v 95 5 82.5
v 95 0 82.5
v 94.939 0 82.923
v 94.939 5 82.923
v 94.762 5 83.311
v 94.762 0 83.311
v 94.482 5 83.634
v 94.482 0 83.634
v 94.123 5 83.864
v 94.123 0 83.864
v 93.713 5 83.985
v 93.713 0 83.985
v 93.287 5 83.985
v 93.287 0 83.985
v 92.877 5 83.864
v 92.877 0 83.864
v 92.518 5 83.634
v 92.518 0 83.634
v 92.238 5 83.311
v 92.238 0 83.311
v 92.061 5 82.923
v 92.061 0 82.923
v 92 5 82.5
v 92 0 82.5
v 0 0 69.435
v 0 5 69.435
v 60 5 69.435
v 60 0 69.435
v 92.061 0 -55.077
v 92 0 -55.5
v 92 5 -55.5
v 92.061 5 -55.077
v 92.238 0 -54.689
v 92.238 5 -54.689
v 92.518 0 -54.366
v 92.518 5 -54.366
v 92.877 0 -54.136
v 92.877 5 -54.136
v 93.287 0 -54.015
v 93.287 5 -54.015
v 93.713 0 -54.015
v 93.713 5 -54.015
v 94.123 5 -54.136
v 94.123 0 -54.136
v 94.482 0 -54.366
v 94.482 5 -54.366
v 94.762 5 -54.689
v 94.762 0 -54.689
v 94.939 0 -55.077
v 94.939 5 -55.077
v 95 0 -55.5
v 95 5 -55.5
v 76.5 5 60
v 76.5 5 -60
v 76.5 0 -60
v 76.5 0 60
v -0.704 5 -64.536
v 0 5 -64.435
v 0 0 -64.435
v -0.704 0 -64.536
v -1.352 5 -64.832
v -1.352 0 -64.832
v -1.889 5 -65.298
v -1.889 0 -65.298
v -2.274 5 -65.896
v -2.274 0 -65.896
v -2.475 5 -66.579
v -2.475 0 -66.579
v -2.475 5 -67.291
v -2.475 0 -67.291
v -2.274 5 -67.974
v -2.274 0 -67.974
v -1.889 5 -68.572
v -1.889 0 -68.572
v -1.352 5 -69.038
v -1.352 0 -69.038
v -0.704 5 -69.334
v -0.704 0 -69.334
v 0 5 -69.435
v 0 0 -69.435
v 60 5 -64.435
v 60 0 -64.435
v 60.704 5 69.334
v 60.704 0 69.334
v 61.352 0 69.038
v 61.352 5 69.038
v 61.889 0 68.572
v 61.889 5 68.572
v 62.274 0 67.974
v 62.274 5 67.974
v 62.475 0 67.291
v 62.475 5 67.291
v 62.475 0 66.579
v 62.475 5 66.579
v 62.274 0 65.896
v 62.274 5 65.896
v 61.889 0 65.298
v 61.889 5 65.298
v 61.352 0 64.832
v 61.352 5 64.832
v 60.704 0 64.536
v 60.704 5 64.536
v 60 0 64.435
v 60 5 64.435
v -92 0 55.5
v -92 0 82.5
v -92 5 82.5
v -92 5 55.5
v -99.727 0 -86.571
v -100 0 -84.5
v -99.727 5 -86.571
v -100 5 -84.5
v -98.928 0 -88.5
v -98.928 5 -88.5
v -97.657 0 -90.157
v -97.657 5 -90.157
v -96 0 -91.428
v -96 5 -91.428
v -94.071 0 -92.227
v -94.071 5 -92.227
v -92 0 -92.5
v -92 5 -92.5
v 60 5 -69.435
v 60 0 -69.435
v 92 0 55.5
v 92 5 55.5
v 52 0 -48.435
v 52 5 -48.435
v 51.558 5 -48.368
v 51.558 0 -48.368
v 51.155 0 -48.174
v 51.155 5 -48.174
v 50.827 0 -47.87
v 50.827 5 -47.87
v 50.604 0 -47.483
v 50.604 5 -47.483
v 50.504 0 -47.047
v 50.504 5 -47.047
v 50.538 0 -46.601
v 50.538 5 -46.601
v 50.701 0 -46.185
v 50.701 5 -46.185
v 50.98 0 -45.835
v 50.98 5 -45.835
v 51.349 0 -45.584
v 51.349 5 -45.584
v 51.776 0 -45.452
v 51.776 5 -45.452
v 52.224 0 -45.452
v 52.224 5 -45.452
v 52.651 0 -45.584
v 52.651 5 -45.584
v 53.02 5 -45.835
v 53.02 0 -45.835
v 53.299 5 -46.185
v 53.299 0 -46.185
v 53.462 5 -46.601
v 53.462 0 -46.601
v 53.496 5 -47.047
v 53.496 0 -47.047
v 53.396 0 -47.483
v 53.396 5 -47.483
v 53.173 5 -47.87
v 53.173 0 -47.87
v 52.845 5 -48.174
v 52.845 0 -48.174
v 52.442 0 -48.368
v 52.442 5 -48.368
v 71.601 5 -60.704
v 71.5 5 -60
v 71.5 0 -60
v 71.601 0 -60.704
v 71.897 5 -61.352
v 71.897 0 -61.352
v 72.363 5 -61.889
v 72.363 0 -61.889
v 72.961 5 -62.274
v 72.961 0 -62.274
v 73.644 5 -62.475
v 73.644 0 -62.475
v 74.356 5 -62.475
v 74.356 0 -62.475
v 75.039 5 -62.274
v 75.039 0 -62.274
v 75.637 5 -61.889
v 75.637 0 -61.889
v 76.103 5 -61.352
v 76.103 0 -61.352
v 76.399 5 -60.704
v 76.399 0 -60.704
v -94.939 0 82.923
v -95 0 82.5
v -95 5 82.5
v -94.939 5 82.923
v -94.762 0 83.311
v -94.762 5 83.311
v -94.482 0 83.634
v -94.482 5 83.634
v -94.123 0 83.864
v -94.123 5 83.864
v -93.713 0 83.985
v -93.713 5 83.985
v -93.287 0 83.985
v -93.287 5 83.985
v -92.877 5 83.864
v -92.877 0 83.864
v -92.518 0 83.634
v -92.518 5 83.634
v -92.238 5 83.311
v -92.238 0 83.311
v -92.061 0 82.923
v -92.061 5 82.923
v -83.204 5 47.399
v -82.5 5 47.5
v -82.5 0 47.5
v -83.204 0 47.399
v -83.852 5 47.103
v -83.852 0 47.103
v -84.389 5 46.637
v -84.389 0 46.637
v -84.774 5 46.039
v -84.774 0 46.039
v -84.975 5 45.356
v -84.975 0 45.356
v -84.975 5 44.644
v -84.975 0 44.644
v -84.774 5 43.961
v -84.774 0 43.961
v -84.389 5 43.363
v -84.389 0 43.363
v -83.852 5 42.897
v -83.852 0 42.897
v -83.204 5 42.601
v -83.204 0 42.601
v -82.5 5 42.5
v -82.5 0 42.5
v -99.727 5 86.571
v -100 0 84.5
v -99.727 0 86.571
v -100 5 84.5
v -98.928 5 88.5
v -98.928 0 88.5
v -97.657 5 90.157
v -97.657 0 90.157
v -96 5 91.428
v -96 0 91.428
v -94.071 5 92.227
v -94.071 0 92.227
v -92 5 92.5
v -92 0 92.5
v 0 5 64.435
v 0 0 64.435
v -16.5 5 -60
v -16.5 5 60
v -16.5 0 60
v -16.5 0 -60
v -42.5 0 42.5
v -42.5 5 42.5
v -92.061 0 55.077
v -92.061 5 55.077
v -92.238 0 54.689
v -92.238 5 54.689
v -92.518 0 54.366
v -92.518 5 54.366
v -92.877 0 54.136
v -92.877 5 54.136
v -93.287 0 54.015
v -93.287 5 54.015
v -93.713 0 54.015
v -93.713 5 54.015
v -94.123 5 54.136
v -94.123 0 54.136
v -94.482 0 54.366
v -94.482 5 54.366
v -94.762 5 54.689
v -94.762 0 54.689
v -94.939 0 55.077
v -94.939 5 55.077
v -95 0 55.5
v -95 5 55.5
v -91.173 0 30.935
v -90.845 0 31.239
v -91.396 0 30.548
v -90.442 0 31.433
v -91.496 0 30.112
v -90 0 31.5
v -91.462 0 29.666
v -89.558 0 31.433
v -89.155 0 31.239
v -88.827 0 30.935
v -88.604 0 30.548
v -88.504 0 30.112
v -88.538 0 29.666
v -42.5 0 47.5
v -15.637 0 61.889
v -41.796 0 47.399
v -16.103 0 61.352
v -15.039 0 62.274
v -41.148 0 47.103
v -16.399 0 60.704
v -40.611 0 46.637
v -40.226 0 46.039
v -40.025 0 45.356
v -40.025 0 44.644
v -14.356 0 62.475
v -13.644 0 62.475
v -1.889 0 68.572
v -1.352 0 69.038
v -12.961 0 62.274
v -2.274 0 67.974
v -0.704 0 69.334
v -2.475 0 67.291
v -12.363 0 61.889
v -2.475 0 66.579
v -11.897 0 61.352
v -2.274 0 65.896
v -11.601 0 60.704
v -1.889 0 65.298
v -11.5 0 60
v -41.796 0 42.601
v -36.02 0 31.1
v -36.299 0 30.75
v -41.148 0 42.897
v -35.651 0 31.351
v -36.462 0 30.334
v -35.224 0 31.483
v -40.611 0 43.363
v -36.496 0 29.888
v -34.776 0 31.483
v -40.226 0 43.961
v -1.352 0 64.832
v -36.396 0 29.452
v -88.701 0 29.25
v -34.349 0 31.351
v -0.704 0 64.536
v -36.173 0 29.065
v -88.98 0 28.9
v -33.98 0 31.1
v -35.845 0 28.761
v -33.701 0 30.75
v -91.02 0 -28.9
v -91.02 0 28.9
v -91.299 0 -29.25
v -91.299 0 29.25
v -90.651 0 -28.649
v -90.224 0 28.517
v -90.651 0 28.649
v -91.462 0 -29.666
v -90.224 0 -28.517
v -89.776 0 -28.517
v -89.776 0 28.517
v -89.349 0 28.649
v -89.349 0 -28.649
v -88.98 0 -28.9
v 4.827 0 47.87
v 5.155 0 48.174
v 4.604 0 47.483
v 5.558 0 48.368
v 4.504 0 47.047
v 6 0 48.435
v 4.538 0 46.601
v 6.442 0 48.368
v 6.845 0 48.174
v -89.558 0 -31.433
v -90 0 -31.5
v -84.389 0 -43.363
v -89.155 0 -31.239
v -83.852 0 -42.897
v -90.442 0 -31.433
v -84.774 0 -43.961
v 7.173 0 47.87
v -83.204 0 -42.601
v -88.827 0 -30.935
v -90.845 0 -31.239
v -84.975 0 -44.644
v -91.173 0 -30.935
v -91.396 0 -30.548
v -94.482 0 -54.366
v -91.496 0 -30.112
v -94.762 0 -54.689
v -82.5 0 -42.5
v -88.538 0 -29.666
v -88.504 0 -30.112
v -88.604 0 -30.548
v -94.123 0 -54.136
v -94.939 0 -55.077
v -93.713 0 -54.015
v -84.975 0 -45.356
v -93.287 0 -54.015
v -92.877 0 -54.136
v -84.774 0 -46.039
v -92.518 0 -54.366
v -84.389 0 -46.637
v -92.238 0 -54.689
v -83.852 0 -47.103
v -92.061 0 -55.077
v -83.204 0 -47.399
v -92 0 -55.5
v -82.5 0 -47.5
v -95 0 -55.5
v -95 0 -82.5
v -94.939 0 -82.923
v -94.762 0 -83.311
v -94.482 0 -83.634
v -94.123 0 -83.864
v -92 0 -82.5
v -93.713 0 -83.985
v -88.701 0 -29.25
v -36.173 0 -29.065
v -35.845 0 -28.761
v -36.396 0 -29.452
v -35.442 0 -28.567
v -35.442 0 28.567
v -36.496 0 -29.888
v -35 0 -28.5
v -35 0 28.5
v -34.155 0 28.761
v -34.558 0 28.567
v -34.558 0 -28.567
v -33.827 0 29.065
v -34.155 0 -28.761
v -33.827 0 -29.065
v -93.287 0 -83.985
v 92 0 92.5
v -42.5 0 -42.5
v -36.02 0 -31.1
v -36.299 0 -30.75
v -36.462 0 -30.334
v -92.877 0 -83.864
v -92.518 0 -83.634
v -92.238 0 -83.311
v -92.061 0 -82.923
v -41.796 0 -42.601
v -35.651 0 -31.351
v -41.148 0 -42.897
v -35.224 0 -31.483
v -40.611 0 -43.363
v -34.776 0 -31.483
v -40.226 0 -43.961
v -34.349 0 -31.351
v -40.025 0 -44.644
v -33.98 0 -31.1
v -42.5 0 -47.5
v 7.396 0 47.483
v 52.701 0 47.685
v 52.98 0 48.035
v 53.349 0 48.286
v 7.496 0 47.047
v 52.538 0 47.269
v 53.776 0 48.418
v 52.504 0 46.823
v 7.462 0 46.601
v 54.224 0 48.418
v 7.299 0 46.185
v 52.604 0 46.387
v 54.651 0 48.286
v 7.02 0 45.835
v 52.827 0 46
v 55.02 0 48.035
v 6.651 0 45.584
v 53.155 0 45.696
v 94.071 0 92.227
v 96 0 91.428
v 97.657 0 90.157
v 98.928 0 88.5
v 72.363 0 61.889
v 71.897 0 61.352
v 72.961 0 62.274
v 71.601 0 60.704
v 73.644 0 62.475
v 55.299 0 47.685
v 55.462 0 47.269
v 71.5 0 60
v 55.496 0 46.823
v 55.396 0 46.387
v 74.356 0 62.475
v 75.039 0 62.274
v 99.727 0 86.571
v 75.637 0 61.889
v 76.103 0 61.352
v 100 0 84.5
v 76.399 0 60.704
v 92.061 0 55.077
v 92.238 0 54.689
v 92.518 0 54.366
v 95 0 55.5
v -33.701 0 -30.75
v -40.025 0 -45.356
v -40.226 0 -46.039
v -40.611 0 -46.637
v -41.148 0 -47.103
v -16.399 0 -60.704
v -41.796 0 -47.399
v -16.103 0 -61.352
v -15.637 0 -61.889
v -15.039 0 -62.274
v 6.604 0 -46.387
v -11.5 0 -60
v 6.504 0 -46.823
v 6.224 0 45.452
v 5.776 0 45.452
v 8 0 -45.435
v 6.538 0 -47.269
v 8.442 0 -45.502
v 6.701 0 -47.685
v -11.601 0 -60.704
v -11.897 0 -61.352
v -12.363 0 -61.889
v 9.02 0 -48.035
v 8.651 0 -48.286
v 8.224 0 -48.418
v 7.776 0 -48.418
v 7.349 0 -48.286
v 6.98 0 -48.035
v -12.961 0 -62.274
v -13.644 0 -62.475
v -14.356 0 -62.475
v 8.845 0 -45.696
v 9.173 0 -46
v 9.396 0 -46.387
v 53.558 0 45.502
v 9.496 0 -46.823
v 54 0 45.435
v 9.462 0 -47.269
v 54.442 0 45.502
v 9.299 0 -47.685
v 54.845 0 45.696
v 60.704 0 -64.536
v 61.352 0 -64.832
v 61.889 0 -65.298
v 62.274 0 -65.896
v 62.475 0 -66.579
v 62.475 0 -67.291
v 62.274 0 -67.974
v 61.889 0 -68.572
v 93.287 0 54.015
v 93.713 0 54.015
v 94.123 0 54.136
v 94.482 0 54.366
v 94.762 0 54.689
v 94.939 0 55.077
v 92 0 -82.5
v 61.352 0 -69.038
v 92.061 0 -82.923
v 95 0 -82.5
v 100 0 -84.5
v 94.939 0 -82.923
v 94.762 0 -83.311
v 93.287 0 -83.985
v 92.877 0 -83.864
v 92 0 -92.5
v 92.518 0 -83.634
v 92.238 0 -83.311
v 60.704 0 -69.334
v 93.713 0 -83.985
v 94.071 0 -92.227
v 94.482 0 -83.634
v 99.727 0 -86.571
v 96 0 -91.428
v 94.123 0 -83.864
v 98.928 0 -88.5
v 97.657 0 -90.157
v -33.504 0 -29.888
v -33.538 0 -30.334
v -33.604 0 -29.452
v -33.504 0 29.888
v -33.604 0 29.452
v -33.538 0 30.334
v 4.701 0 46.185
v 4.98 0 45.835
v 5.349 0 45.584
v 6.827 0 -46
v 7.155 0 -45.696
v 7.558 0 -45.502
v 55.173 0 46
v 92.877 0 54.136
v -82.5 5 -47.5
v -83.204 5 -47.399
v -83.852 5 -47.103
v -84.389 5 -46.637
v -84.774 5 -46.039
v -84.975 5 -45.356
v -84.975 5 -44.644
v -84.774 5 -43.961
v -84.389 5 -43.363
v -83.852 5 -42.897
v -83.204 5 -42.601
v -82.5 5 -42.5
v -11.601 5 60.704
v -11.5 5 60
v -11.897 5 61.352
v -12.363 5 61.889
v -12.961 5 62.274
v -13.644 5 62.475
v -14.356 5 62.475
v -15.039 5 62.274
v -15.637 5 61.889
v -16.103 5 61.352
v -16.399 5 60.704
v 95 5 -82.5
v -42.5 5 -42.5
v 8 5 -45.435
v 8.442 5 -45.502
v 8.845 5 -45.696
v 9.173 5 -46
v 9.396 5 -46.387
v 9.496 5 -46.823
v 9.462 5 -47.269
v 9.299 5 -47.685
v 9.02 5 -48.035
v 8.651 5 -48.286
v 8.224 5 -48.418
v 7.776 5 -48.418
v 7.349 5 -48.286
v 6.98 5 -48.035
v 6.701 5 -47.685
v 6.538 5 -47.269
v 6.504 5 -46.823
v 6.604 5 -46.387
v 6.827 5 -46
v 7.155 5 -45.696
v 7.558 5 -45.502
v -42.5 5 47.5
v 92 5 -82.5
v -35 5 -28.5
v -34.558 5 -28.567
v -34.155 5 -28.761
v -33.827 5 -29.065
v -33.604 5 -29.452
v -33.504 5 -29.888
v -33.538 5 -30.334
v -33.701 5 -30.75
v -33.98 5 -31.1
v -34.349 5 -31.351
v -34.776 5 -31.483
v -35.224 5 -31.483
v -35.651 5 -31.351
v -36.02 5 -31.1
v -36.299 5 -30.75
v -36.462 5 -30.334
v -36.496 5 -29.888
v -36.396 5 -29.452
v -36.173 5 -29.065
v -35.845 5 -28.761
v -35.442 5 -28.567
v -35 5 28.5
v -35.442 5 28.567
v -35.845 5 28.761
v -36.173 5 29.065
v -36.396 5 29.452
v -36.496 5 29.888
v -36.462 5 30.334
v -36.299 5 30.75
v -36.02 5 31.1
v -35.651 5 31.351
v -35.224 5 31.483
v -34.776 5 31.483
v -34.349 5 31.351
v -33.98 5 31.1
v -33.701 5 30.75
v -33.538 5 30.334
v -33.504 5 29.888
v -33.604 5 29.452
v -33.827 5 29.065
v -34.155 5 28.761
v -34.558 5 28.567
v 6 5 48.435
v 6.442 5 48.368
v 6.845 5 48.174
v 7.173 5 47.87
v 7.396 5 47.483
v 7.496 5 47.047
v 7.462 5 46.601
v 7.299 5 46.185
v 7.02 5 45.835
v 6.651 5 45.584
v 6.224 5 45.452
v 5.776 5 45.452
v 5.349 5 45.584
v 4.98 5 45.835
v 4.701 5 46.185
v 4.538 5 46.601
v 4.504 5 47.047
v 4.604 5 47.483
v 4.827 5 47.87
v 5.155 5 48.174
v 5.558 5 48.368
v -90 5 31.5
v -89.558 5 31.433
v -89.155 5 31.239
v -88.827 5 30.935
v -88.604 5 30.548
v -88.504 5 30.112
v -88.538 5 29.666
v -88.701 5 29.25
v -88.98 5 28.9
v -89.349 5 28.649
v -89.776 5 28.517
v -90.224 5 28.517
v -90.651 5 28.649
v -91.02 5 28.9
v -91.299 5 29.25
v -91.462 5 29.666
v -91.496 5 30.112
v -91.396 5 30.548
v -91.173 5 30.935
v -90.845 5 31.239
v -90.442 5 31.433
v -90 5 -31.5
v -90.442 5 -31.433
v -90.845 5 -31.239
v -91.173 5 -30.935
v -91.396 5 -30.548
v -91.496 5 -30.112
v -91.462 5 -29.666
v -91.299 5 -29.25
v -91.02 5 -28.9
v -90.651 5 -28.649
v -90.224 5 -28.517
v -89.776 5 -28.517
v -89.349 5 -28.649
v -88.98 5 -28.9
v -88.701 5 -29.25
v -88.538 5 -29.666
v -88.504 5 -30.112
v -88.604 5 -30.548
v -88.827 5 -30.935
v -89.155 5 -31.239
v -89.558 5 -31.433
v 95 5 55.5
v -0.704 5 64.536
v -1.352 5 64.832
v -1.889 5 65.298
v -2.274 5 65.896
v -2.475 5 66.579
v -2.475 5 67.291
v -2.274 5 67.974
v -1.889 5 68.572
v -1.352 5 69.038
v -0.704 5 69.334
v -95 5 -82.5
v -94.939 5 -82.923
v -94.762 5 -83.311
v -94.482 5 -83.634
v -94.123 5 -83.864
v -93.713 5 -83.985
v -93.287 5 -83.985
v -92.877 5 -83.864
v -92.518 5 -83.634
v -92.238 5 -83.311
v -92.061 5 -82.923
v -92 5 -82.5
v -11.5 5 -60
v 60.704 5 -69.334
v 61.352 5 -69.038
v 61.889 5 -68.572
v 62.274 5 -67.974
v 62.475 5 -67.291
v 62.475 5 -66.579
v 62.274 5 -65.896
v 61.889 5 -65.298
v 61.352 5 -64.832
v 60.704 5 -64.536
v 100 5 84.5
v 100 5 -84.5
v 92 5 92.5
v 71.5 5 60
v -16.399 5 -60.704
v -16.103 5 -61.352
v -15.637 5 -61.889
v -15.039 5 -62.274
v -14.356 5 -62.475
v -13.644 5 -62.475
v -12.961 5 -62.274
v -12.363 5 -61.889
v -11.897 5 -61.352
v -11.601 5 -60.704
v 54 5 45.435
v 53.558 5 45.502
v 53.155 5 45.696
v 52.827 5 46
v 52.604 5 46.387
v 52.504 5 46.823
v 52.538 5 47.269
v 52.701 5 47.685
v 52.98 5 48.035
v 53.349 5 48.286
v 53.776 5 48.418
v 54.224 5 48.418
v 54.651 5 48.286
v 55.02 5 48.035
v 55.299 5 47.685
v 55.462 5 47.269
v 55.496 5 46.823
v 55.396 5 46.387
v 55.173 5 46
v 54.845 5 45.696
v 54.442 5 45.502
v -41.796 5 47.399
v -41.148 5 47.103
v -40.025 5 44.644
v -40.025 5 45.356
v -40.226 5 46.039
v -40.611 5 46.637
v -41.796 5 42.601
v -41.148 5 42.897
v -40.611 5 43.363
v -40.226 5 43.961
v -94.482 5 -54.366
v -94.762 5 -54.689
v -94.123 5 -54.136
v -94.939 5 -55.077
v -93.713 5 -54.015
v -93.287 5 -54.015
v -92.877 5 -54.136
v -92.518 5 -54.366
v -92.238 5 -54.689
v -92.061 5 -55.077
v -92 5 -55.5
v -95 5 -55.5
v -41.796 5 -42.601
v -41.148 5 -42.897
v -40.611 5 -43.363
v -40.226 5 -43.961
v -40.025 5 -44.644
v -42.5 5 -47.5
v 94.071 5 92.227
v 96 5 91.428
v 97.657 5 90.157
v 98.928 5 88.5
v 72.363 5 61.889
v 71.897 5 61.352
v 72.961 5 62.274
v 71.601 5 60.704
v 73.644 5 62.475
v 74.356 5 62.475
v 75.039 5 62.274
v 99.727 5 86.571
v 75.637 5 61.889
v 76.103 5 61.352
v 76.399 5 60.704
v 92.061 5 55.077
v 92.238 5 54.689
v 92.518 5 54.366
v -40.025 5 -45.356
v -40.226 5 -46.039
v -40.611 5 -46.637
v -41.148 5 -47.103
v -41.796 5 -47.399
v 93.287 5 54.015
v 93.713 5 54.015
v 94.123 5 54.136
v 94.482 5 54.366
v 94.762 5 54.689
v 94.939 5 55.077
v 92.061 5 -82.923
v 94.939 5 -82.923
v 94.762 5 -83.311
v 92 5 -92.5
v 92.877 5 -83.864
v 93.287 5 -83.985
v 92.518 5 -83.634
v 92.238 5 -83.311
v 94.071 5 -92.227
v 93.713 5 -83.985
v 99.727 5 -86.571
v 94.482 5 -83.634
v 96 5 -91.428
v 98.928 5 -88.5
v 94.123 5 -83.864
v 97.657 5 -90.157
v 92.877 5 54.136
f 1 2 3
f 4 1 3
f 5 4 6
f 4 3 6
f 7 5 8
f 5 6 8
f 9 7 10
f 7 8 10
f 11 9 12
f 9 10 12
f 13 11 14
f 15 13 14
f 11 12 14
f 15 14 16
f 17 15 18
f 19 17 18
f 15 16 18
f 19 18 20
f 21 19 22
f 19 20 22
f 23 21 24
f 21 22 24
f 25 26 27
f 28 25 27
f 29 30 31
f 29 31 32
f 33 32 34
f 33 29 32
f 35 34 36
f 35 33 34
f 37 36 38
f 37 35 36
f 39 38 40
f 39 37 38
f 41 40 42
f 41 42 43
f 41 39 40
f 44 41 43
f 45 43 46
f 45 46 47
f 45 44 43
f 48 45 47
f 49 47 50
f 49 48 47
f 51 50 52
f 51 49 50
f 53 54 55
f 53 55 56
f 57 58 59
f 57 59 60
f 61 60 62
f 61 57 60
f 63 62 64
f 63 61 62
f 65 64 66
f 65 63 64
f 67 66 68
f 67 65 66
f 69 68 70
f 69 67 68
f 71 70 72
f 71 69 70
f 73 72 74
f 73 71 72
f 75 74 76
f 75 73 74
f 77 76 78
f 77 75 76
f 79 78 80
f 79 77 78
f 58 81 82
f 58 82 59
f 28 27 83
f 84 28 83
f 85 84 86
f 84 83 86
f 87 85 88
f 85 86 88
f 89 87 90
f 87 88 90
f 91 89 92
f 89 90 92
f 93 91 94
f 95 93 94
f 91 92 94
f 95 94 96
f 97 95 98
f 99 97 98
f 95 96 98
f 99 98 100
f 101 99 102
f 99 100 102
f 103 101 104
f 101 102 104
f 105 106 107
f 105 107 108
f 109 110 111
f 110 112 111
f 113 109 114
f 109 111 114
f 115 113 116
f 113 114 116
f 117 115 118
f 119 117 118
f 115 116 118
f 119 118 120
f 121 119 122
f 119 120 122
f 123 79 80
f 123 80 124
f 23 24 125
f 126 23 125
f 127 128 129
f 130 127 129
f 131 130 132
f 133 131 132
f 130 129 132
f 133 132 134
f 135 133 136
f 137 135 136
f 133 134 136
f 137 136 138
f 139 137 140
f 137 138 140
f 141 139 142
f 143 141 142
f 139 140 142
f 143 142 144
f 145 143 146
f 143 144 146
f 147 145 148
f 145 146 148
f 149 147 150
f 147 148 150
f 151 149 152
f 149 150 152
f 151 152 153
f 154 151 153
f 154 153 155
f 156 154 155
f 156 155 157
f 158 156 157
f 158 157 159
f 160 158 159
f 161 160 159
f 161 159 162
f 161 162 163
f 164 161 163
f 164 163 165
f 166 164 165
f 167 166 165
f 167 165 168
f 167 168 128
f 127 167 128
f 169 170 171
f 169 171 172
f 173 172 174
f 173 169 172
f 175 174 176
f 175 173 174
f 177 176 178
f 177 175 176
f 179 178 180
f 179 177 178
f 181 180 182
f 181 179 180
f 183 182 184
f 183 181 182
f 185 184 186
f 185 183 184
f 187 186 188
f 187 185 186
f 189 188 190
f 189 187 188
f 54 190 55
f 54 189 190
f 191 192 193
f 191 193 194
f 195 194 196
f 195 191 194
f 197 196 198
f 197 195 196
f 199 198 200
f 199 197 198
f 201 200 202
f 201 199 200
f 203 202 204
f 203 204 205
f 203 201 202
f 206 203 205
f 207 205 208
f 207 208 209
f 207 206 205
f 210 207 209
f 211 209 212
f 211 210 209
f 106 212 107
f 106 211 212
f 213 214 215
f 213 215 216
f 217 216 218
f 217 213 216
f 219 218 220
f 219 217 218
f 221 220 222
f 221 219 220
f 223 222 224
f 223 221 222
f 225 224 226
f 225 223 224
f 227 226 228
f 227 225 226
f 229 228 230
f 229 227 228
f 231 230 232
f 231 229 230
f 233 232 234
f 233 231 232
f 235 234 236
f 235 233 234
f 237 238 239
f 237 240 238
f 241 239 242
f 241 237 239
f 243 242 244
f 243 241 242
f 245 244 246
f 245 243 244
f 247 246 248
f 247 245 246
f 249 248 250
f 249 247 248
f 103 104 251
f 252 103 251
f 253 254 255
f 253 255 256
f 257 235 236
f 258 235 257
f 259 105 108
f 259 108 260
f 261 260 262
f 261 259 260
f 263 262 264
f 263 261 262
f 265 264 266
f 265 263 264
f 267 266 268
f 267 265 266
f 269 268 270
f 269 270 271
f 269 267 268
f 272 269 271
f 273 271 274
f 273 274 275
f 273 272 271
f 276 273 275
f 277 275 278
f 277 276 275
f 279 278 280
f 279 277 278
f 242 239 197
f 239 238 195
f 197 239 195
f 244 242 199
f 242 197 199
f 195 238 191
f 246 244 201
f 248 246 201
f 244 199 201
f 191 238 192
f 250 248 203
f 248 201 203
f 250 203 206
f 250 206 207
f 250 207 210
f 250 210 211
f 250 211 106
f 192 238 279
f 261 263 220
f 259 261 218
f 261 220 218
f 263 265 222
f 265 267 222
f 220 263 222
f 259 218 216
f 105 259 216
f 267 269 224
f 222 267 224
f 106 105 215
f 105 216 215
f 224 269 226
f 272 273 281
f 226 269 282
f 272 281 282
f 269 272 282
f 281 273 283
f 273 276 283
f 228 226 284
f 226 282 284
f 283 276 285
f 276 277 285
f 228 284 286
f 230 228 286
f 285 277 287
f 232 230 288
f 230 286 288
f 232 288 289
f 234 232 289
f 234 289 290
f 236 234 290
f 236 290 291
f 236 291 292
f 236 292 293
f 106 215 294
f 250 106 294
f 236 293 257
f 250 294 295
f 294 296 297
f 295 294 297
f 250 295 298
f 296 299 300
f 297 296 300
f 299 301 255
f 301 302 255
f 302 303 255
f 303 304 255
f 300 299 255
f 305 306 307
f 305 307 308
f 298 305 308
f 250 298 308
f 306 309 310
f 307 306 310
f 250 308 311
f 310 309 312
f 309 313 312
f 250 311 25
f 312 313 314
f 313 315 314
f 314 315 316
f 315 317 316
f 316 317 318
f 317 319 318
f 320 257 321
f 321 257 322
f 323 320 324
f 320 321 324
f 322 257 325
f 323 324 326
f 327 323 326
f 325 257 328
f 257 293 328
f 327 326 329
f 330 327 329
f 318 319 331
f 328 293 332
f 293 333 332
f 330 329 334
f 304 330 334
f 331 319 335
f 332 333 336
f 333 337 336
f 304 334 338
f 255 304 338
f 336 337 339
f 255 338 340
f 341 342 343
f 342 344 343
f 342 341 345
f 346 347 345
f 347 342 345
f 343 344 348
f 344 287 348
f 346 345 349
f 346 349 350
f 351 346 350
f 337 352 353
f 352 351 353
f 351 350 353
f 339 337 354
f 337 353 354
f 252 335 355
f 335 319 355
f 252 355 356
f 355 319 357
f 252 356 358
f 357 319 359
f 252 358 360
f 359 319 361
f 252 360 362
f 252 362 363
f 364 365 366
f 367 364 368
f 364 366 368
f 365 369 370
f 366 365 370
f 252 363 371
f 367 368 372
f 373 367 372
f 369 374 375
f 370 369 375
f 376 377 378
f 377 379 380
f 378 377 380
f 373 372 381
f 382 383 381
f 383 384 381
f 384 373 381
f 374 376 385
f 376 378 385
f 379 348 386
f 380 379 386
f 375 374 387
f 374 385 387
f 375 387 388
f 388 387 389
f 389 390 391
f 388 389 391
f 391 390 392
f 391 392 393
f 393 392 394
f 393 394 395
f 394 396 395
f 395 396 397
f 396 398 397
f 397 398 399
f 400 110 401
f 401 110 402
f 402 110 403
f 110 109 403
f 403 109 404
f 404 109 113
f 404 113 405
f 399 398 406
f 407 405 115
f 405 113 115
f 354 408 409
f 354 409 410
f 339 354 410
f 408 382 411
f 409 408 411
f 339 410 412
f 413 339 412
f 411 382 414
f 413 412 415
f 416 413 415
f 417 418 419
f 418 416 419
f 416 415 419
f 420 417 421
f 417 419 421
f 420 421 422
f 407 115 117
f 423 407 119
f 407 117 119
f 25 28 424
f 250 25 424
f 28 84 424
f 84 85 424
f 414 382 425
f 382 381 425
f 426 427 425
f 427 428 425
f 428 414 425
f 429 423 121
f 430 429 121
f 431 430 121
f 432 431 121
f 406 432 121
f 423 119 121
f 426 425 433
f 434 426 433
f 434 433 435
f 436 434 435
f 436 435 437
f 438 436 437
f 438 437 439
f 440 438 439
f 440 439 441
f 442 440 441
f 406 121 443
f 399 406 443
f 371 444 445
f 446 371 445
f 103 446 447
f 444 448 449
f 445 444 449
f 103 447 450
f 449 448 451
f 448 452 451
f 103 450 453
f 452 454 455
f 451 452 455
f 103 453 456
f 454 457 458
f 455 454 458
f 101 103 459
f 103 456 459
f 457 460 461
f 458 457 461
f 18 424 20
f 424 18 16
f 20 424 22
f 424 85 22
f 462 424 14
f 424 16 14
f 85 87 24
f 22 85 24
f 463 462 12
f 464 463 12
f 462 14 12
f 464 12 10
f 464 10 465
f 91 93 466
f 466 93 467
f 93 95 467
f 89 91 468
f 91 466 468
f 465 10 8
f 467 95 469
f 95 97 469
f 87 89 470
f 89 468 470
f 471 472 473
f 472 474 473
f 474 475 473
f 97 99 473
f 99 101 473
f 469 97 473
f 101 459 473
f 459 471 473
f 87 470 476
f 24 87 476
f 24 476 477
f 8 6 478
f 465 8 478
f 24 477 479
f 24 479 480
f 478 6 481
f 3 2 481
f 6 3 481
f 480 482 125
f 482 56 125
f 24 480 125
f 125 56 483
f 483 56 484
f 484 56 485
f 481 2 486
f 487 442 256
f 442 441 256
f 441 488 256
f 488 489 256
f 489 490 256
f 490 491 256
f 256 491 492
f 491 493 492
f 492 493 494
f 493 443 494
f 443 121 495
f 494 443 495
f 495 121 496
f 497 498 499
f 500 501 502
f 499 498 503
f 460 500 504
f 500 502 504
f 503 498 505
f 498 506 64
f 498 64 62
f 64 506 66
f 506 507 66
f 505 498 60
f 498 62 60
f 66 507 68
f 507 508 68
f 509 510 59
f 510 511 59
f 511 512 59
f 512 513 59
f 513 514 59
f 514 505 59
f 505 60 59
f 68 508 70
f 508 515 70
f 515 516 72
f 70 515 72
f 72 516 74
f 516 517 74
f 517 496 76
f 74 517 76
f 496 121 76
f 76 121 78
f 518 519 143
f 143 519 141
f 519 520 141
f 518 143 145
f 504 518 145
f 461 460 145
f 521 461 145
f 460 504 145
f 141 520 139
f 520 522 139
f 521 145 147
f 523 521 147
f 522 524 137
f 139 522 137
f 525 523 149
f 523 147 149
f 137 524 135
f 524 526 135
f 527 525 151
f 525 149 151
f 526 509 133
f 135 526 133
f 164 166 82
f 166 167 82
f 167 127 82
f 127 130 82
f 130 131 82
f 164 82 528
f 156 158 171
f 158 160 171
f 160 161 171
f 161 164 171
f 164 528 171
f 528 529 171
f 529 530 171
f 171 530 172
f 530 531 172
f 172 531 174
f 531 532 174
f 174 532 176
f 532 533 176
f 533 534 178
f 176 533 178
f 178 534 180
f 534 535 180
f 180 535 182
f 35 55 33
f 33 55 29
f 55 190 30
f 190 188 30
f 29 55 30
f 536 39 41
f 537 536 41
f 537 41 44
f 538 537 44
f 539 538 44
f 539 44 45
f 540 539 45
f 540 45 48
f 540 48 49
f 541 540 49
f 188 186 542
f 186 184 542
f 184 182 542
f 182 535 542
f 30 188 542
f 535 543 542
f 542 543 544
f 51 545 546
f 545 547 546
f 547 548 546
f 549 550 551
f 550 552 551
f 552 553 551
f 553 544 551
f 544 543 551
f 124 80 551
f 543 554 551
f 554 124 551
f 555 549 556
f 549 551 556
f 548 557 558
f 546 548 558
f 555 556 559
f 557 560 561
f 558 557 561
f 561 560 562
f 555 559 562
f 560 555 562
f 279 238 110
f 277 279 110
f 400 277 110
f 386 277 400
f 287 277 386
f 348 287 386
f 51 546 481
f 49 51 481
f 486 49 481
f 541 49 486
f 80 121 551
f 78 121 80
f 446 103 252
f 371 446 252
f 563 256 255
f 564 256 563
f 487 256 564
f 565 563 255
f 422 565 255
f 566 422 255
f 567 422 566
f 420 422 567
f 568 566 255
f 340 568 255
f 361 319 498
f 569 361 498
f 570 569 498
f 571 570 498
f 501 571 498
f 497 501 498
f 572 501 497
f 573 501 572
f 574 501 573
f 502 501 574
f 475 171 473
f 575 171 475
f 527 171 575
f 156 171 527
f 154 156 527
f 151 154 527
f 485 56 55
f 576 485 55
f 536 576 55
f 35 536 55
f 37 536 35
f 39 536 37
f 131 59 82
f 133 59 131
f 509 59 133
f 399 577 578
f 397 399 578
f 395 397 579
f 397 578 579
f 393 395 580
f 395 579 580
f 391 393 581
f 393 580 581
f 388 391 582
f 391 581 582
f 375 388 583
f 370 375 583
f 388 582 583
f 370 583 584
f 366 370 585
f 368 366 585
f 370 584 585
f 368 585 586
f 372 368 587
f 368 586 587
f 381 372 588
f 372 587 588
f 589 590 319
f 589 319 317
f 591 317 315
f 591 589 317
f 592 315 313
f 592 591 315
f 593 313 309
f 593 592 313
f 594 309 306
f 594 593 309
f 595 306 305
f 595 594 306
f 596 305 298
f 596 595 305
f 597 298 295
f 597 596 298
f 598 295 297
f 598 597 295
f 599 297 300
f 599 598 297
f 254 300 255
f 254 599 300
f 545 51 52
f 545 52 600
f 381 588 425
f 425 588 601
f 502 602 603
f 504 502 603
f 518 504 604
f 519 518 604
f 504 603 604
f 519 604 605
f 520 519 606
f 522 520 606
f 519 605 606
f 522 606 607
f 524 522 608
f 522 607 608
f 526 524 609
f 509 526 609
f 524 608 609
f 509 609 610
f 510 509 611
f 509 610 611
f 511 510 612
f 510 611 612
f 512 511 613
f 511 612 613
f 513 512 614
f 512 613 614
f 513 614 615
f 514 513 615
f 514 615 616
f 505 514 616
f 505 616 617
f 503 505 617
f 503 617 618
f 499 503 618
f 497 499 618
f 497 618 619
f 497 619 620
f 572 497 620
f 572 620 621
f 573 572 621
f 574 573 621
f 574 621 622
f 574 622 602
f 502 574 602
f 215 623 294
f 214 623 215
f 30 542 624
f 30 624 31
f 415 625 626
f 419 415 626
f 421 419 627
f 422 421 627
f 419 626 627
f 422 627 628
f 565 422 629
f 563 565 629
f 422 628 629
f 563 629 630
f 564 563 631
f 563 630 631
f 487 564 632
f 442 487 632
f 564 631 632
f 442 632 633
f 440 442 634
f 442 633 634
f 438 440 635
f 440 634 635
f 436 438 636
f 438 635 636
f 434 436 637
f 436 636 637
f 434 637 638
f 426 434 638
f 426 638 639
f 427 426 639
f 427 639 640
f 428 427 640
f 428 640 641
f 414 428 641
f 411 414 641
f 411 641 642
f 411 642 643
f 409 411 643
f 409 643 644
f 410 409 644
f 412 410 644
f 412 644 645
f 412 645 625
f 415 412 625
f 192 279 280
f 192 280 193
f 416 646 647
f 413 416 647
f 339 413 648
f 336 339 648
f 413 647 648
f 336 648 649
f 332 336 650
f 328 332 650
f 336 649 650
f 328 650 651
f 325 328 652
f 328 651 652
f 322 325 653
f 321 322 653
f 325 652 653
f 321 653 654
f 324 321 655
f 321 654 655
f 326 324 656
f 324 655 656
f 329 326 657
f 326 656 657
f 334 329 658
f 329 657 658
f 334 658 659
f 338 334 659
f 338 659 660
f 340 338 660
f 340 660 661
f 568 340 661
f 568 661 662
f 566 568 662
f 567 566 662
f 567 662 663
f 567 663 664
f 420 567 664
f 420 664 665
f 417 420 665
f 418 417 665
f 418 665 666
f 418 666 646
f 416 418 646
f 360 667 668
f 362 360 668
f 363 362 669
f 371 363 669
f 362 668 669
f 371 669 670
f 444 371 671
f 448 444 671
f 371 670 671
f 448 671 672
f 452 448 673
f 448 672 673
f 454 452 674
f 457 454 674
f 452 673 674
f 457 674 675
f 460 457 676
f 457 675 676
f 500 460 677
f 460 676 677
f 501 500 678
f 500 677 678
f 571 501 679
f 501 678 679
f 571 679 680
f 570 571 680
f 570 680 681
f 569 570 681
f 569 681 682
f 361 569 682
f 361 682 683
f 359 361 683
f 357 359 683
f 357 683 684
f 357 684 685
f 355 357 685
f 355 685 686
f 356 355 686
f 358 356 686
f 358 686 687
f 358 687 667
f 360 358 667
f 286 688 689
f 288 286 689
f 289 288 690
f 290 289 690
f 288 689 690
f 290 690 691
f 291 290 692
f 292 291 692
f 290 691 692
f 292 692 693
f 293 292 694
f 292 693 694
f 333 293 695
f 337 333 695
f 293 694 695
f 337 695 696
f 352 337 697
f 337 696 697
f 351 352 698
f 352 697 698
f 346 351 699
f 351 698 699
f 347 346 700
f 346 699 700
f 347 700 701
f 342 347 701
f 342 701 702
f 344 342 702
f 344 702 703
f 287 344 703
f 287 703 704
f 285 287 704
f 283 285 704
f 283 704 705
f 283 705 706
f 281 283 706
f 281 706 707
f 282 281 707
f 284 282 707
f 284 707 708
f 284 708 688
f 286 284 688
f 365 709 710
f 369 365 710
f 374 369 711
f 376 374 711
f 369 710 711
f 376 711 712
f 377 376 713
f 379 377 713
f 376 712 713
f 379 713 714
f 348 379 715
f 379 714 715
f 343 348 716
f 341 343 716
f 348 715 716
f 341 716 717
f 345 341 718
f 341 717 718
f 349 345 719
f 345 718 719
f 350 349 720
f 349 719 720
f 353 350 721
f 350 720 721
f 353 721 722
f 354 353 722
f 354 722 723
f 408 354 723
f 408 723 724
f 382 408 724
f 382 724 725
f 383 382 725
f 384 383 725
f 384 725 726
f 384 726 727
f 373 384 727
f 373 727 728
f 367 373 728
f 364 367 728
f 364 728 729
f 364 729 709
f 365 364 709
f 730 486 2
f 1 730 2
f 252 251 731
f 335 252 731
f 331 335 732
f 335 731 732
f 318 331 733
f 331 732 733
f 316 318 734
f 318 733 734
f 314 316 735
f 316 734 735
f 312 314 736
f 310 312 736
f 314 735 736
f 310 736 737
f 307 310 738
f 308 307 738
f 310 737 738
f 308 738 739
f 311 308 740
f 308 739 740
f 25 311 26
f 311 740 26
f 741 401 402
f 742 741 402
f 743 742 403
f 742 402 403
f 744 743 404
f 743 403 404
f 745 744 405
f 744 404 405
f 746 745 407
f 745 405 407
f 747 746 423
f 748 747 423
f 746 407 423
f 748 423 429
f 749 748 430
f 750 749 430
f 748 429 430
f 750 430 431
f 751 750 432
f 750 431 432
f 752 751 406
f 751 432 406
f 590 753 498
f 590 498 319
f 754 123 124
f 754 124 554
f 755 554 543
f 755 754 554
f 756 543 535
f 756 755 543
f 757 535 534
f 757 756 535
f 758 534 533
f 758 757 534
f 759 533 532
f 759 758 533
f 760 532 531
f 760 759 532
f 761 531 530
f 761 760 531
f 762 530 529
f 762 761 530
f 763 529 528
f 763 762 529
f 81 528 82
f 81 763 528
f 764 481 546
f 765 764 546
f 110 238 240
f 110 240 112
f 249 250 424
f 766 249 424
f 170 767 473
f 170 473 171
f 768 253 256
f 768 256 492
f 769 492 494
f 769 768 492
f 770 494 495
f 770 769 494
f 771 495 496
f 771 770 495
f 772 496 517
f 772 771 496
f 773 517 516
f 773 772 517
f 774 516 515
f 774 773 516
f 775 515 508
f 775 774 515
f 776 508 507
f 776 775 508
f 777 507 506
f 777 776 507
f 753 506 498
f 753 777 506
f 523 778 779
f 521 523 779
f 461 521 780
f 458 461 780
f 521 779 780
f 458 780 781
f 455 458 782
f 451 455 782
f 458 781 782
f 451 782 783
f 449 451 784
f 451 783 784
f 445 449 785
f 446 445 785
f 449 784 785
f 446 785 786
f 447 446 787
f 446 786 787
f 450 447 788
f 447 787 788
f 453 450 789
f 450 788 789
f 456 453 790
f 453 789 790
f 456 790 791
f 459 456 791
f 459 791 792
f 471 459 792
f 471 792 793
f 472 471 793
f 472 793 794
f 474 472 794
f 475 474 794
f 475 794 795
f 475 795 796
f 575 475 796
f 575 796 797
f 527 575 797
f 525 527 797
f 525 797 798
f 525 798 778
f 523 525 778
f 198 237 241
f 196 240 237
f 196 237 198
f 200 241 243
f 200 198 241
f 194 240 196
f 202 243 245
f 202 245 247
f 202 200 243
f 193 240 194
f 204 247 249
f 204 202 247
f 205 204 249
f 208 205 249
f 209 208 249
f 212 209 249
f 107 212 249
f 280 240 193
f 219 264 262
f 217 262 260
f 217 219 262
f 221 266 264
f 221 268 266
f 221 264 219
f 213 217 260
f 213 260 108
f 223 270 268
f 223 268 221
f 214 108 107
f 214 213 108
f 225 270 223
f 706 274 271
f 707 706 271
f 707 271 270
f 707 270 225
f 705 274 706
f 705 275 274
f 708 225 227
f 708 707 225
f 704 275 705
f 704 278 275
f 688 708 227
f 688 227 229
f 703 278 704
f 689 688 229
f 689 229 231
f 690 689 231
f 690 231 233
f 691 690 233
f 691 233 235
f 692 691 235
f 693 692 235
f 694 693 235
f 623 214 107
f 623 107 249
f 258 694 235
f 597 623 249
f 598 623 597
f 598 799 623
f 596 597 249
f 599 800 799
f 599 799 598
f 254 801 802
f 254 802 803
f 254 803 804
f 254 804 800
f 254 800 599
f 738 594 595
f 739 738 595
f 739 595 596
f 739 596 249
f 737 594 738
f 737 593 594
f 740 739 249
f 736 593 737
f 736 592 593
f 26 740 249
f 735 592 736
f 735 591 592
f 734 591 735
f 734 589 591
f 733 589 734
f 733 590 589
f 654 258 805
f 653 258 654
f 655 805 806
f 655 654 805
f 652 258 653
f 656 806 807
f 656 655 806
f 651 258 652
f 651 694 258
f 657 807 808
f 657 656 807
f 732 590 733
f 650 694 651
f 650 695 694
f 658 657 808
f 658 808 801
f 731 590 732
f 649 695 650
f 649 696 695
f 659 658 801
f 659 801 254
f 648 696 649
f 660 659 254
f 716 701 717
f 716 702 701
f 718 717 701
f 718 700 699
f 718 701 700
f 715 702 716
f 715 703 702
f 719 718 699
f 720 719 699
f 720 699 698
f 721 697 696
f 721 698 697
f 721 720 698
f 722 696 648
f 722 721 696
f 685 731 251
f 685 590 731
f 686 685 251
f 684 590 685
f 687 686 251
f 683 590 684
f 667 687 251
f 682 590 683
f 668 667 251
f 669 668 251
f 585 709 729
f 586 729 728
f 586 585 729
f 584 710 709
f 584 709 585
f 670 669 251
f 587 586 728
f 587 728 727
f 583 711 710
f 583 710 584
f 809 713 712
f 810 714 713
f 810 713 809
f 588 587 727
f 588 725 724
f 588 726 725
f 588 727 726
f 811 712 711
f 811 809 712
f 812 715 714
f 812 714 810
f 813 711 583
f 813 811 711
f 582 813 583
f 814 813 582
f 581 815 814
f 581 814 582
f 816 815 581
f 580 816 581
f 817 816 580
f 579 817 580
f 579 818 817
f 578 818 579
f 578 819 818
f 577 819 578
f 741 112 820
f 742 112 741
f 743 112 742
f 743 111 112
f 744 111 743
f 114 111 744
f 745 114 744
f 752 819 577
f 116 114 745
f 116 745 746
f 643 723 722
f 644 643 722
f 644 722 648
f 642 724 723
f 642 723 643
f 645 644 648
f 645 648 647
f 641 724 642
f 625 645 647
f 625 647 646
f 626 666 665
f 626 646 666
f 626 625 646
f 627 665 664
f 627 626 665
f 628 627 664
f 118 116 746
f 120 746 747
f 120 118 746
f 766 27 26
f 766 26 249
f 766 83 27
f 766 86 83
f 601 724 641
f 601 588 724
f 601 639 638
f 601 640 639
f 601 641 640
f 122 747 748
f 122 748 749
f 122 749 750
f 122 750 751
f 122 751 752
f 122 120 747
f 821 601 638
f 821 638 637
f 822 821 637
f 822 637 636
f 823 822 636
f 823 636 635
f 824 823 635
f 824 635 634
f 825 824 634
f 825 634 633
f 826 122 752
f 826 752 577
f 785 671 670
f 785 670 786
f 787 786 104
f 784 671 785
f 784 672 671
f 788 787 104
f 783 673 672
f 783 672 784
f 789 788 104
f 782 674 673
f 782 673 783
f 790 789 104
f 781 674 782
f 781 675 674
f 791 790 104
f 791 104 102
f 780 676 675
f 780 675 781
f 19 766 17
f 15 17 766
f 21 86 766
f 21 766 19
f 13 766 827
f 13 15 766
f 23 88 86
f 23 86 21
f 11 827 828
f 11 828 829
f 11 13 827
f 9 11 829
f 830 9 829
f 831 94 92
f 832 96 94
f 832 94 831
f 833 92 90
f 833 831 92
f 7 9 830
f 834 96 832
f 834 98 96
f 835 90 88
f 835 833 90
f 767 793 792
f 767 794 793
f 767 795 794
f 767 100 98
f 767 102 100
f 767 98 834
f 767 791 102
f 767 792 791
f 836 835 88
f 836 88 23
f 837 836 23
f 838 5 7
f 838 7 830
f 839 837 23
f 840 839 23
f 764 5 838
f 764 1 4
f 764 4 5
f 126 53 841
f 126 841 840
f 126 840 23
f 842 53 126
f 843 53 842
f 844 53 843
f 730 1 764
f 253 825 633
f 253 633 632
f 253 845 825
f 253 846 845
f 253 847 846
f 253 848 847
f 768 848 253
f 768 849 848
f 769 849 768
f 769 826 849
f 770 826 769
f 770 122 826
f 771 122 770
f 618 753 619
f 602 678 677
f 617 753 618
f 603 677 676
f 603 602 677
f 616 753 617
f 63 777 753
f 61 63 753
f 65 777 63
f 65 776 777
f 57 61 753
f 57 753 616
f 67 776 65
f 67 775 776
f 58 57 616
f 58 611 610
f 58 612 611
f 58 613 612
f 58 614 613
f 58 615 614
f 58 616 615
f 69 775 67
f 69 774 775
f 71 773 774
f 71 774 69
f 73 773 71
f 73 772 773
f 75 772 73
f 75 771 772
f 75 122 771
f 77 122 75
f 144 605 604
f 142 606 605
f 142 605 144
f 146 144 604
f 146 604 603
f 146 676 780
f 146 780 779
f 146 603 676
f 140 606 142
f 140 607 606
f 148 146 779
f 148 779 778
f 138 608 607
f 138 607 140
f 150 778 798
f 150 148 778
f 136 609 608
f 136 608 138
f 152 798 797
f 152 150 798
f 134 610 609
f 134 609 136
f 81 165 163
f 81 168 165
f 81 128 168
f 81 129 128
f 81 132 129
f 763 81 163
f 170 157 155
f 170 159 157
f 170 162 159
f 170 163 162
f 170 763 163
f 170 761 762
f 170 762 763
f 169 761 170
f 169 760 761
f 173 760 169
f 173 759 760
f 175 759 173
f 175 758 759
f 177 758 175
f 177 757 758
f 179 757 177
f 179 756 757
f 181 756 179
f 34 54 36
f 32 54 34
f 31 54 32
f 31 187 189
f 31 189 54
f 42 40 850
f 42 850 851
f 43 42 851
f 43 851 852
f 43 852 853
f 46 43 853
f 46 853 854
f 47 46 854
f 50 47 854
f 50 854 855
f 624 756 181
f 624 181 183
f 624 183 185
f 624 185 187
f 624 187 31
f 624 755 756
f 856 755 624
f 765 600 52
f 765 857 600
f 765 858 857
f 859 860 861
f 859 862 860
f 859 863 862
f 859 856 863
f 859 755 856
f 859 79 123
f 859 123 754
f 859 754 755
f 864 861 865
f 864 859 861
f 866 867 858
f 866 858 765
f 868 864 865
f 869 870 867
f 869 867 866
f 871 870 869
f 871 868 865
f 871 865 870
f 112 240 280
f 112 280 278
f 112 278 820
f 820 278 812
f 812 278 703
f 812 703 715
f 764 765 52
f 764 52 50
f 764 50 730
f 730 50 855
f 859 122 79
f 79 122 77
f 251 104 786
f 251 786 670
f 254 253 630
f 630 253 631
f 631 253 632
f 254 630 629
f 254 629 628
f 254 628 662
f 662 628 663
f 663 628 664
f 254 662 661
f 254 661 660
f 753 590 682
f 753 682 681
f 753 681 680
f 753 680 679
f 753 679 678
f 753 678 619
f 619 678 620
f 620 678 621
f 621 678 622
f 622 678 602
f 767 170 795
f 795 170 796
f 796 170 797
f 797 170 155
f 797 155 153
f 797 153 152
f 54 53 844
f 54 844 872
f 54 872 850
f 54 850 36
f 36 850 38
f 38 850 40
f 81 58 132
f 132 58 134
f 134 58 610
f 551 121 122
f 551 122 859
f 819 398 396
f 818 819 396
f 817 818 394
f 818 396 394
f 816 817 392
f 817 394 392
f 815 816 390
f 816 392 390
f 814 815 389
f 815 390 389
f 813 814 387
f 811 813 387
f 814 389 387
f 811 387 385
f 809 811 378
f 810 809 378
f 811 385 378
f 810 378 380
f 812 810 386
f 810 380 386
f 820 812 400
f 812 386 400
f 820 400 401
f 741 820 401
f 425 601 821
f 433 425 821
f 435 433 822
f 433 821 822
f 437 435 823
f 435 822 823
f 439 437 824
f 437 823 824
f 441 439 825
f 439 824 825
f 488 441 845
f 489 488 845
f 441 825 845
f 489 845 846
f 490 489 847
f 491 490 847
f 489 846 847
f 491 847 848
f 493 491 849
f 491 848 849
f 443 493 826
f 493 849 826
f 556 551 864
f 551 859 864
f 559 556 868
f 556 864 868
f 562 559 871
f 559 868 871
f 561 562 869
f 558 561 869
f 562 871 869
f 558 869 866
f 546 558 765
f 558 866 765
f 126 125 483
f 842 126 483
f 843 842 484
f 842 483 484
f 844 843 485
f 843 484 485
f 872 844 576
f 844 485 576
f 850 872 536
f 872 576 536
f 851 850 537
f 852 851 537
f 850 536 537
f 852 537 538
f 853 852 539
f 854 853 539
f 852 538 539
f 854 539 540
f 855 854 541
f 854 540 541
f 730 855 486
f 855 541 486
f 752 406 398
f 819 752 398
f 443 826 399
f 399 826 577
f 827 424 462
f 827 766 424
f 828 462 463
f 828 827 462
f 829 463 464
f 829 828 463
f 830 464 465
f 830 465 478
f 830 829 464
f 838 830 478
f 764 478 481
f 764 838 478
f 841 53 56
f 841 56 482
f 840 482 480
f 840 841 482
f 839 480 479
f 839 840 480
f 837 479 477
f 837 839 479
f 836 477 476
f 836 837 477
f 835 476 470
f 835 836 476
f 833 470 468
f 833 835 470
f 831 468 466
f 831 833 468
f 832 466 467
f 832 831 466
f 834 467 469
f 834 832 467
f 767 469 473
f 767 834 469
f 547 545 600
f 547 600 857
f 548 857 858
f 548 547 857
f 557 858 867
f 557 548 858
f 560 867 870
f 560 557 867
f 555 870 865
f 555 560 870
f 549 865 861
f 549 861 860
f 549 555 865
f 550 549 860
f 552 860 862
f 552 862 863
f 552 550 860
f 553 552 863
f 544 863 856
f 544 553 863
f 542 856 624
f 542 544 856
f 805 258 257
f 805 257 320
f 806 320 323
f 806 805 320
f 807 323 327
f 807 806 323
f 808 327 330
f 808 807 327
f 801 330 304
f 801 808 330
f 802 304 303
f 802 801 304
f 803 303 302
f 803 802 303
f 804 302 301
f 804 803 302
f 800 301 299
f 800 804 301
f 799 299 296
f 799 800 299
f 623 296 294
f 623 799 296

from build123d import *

# Parameters (mm, degrees)
SKETCH2_W           = 200
SKETCH2_H           = 185
BOSS_EXTRUDE1_DEPTH = 5
SKETCH3_R           = 1.5
CUT_EXTRUDE1_DEPTH  = 137.313058802
SKETCH4_R           = 1.5
CUT_EXTRUDE3_DEPTH  = 137.313058802
FILLET1_R           = 8


with BuildPart() as part:
    # Sketch2 → Boss-Extrude1 (new body)
    with BuildSketch(Plane(origin=(0, 0, 0), x_dir=(1, 0, 0), z_dir=(0, 1, 0))):
        Rectangle(SKETCH2_W, SKETCH2_H)
        with BuildLine():
            Line((-95, 55.5), (-95, 82.5))
            ThreePointArc((-95, 82.5), (-93.5, 84), (-92, 82.5))
            Line((-92, 82.5), (-92, 55.5))
            ThreePointArc((-92, 55.5), (-93.5, 54), (-95, 55.5))
        make_face(mode=Mode.SUBTRACT)
        with BuildLine():
            Line((95, 55.5), (95, 82.5))
            ThreePointArc((95, 82.5), (93.5, 84), (92, 82.5))
            Line((92, 82.5), (92, 55.5))
            ThreePointArc((92, 55.5), (93.5, 54), (95, 55.5))
        make_face(mode=Mode.SUBTRACT)
        with BuildLine():
            Line((95, -55.5), (95, -82.5))
            ThreePointArc((95, -82.5), (93.5, -84), (92, -82.5))
            Line((92, -82.5), (92, -55.5))
            ThreePointArc((92, -55.5), (93.5, -54), (95, -55.5))
        make_face(mode=Mode.SUBTRACT)
        with BuildLine():
            Line((-95, -55.5), (-95, -82.5))
            ThreePointArc((-95, -82.5), (-93.5, -84), (-92, -82.5))
            Line((-92, -82.5), (-92, -55.5))
            ThreePointArc((-92, -55.5), (-93.5, -54), (-95, -55.5))
        make_face(mode=Mode.SUBTRACT)
    extrude(amount=BOSS_EXTRUDE1_DEPTH)

    # Sketch3 → Cut-Extrude1 (cut, through all)
    with BuildSketch(Plane(origin=(0, 5, 0), x_dir=(1, 0, 0), z_dir=(0, 1, 0))):
        with BuildLine():
            Line((-82.5, 42.5), (-42.5, 42.5))
            ThreePointArc((-42.5, 42.5), (-40, 45), (-42.5, 47.5))
            Line((-42.5, 47.5), (-82.5, 47.5))
            ThreePointArc((-82.5, 47.5), (-85, 45), (-82.5, 42.5))
        make_face()
        with BuildLine():
            ThreePointArc((-42.5, -42.5), (-40, -45), (-42.5, -47.5))
            Line((-42.5, -47.5), (-82.5, -47.5))
            ThreePointArc((-82.5, -47.5), (-85, -45), (-82.5, -42.5))
            Line((-82.5, -42.5), (-42.5, -42.5))
        make_face()
        with Locations(Location((-90, -30, 0), (0, 0, 270))):
            Circle(SKETCH3_R)
        with Locations(Location((-90, 30, 0), (0, 0, 90))):
            Circle(SKETCH3_R)
        with Locations(Location((-35, -30, 0), (0, 0, 90))):
            Circle(SKETCH3_R)
        with Locations(Location((-35, 30, 0), (0, 0, 270))):
            Circle(SKETCH3_R)
    extrude(amount=-CUT_EXTRUDE1_DEPTH, mode=Mode.SUBTRACT)

    # Sketch4 → Cut-Extrude3 (cut, through all)
    with BuildSketch(Plane(origin=(0, 5, 0), x_dir=(1, 0, 0), z_dir=(0, 1, 0))):
        with Locations(Location((8, 46.935, 0), (0, 0, 270))):
            Circle(SKETCH4_R)
        with Locations(Location((52, 46.935, 0), (0, 0, 90))):
            Circle(SKETCH4_R)
        with Locations(Location((6, -46.935, 0), (0, 0, 270))):
            Circle(SKETCH4_R)
        with Locations(Location((54, -46.935, 0), (0, 0, 90))):
            Circle(SKETCH4_R)
        with BuildLine():
            Line((71.5, -60), (71.5, 60))
            ThreePointArc((71.5, 60), (74, 62.5), (76.5, 60))
            Line((76.5, 60), (76.5, -60))
            ThreePointArc((76.5, -60), (74, -62.5), (71.5, -60))
        make_face()
        with BuildLine():
            Line((-16.5, -60), (-16.5, 60))
            ThreePointArc((-16.5, 60), (-14, 62.5), (-11.5, 60))
            Line((-11.5, 60), (-11.5, -60))
            ThreePointArc((-11.5, -60), (-14, -62.5), (-16.5, -60))
        make_face()
        with BuildLine():
            Line((0, 69.435), (60, 69.435))
            ThreePointArc((60, 69.435), (62.5, 66.935), (60, 64.435))
            Line((60, 64.435), (0, 64.435))
            ThreePointArc((0, 64.435), (-2.5, 66.935), (0, 69.435))
        make_face()
        with BuildLine():
            Line((0, -69.435), (60, -69.435))
            ThreePointArc((60, -69.435), (62.5, -66.935), (60, -64.435))
            Line((60, -64.435), (0, -64.435))
            ThreePointArc((0, -64.435), (-2.5, -66.935), (0, -69.435))
        make_face()
    extrude(amount=-CUT_EXTRUDE3_DEPTH, mode=Mode.SUBTRACT)

    # Fillet1
    fillet1_edges = [part.edges().sort_by_distance(p)[0] for p in [
        (100, 2.5, 92.5),
        (-100, 2.5, 92.5),
        (-100, 2.5, -92.5),
        (100, 2.5, -92.5),
    ]]
    fillet(fillet1_edges, radius=FILLET1_R)


solid = part.part
